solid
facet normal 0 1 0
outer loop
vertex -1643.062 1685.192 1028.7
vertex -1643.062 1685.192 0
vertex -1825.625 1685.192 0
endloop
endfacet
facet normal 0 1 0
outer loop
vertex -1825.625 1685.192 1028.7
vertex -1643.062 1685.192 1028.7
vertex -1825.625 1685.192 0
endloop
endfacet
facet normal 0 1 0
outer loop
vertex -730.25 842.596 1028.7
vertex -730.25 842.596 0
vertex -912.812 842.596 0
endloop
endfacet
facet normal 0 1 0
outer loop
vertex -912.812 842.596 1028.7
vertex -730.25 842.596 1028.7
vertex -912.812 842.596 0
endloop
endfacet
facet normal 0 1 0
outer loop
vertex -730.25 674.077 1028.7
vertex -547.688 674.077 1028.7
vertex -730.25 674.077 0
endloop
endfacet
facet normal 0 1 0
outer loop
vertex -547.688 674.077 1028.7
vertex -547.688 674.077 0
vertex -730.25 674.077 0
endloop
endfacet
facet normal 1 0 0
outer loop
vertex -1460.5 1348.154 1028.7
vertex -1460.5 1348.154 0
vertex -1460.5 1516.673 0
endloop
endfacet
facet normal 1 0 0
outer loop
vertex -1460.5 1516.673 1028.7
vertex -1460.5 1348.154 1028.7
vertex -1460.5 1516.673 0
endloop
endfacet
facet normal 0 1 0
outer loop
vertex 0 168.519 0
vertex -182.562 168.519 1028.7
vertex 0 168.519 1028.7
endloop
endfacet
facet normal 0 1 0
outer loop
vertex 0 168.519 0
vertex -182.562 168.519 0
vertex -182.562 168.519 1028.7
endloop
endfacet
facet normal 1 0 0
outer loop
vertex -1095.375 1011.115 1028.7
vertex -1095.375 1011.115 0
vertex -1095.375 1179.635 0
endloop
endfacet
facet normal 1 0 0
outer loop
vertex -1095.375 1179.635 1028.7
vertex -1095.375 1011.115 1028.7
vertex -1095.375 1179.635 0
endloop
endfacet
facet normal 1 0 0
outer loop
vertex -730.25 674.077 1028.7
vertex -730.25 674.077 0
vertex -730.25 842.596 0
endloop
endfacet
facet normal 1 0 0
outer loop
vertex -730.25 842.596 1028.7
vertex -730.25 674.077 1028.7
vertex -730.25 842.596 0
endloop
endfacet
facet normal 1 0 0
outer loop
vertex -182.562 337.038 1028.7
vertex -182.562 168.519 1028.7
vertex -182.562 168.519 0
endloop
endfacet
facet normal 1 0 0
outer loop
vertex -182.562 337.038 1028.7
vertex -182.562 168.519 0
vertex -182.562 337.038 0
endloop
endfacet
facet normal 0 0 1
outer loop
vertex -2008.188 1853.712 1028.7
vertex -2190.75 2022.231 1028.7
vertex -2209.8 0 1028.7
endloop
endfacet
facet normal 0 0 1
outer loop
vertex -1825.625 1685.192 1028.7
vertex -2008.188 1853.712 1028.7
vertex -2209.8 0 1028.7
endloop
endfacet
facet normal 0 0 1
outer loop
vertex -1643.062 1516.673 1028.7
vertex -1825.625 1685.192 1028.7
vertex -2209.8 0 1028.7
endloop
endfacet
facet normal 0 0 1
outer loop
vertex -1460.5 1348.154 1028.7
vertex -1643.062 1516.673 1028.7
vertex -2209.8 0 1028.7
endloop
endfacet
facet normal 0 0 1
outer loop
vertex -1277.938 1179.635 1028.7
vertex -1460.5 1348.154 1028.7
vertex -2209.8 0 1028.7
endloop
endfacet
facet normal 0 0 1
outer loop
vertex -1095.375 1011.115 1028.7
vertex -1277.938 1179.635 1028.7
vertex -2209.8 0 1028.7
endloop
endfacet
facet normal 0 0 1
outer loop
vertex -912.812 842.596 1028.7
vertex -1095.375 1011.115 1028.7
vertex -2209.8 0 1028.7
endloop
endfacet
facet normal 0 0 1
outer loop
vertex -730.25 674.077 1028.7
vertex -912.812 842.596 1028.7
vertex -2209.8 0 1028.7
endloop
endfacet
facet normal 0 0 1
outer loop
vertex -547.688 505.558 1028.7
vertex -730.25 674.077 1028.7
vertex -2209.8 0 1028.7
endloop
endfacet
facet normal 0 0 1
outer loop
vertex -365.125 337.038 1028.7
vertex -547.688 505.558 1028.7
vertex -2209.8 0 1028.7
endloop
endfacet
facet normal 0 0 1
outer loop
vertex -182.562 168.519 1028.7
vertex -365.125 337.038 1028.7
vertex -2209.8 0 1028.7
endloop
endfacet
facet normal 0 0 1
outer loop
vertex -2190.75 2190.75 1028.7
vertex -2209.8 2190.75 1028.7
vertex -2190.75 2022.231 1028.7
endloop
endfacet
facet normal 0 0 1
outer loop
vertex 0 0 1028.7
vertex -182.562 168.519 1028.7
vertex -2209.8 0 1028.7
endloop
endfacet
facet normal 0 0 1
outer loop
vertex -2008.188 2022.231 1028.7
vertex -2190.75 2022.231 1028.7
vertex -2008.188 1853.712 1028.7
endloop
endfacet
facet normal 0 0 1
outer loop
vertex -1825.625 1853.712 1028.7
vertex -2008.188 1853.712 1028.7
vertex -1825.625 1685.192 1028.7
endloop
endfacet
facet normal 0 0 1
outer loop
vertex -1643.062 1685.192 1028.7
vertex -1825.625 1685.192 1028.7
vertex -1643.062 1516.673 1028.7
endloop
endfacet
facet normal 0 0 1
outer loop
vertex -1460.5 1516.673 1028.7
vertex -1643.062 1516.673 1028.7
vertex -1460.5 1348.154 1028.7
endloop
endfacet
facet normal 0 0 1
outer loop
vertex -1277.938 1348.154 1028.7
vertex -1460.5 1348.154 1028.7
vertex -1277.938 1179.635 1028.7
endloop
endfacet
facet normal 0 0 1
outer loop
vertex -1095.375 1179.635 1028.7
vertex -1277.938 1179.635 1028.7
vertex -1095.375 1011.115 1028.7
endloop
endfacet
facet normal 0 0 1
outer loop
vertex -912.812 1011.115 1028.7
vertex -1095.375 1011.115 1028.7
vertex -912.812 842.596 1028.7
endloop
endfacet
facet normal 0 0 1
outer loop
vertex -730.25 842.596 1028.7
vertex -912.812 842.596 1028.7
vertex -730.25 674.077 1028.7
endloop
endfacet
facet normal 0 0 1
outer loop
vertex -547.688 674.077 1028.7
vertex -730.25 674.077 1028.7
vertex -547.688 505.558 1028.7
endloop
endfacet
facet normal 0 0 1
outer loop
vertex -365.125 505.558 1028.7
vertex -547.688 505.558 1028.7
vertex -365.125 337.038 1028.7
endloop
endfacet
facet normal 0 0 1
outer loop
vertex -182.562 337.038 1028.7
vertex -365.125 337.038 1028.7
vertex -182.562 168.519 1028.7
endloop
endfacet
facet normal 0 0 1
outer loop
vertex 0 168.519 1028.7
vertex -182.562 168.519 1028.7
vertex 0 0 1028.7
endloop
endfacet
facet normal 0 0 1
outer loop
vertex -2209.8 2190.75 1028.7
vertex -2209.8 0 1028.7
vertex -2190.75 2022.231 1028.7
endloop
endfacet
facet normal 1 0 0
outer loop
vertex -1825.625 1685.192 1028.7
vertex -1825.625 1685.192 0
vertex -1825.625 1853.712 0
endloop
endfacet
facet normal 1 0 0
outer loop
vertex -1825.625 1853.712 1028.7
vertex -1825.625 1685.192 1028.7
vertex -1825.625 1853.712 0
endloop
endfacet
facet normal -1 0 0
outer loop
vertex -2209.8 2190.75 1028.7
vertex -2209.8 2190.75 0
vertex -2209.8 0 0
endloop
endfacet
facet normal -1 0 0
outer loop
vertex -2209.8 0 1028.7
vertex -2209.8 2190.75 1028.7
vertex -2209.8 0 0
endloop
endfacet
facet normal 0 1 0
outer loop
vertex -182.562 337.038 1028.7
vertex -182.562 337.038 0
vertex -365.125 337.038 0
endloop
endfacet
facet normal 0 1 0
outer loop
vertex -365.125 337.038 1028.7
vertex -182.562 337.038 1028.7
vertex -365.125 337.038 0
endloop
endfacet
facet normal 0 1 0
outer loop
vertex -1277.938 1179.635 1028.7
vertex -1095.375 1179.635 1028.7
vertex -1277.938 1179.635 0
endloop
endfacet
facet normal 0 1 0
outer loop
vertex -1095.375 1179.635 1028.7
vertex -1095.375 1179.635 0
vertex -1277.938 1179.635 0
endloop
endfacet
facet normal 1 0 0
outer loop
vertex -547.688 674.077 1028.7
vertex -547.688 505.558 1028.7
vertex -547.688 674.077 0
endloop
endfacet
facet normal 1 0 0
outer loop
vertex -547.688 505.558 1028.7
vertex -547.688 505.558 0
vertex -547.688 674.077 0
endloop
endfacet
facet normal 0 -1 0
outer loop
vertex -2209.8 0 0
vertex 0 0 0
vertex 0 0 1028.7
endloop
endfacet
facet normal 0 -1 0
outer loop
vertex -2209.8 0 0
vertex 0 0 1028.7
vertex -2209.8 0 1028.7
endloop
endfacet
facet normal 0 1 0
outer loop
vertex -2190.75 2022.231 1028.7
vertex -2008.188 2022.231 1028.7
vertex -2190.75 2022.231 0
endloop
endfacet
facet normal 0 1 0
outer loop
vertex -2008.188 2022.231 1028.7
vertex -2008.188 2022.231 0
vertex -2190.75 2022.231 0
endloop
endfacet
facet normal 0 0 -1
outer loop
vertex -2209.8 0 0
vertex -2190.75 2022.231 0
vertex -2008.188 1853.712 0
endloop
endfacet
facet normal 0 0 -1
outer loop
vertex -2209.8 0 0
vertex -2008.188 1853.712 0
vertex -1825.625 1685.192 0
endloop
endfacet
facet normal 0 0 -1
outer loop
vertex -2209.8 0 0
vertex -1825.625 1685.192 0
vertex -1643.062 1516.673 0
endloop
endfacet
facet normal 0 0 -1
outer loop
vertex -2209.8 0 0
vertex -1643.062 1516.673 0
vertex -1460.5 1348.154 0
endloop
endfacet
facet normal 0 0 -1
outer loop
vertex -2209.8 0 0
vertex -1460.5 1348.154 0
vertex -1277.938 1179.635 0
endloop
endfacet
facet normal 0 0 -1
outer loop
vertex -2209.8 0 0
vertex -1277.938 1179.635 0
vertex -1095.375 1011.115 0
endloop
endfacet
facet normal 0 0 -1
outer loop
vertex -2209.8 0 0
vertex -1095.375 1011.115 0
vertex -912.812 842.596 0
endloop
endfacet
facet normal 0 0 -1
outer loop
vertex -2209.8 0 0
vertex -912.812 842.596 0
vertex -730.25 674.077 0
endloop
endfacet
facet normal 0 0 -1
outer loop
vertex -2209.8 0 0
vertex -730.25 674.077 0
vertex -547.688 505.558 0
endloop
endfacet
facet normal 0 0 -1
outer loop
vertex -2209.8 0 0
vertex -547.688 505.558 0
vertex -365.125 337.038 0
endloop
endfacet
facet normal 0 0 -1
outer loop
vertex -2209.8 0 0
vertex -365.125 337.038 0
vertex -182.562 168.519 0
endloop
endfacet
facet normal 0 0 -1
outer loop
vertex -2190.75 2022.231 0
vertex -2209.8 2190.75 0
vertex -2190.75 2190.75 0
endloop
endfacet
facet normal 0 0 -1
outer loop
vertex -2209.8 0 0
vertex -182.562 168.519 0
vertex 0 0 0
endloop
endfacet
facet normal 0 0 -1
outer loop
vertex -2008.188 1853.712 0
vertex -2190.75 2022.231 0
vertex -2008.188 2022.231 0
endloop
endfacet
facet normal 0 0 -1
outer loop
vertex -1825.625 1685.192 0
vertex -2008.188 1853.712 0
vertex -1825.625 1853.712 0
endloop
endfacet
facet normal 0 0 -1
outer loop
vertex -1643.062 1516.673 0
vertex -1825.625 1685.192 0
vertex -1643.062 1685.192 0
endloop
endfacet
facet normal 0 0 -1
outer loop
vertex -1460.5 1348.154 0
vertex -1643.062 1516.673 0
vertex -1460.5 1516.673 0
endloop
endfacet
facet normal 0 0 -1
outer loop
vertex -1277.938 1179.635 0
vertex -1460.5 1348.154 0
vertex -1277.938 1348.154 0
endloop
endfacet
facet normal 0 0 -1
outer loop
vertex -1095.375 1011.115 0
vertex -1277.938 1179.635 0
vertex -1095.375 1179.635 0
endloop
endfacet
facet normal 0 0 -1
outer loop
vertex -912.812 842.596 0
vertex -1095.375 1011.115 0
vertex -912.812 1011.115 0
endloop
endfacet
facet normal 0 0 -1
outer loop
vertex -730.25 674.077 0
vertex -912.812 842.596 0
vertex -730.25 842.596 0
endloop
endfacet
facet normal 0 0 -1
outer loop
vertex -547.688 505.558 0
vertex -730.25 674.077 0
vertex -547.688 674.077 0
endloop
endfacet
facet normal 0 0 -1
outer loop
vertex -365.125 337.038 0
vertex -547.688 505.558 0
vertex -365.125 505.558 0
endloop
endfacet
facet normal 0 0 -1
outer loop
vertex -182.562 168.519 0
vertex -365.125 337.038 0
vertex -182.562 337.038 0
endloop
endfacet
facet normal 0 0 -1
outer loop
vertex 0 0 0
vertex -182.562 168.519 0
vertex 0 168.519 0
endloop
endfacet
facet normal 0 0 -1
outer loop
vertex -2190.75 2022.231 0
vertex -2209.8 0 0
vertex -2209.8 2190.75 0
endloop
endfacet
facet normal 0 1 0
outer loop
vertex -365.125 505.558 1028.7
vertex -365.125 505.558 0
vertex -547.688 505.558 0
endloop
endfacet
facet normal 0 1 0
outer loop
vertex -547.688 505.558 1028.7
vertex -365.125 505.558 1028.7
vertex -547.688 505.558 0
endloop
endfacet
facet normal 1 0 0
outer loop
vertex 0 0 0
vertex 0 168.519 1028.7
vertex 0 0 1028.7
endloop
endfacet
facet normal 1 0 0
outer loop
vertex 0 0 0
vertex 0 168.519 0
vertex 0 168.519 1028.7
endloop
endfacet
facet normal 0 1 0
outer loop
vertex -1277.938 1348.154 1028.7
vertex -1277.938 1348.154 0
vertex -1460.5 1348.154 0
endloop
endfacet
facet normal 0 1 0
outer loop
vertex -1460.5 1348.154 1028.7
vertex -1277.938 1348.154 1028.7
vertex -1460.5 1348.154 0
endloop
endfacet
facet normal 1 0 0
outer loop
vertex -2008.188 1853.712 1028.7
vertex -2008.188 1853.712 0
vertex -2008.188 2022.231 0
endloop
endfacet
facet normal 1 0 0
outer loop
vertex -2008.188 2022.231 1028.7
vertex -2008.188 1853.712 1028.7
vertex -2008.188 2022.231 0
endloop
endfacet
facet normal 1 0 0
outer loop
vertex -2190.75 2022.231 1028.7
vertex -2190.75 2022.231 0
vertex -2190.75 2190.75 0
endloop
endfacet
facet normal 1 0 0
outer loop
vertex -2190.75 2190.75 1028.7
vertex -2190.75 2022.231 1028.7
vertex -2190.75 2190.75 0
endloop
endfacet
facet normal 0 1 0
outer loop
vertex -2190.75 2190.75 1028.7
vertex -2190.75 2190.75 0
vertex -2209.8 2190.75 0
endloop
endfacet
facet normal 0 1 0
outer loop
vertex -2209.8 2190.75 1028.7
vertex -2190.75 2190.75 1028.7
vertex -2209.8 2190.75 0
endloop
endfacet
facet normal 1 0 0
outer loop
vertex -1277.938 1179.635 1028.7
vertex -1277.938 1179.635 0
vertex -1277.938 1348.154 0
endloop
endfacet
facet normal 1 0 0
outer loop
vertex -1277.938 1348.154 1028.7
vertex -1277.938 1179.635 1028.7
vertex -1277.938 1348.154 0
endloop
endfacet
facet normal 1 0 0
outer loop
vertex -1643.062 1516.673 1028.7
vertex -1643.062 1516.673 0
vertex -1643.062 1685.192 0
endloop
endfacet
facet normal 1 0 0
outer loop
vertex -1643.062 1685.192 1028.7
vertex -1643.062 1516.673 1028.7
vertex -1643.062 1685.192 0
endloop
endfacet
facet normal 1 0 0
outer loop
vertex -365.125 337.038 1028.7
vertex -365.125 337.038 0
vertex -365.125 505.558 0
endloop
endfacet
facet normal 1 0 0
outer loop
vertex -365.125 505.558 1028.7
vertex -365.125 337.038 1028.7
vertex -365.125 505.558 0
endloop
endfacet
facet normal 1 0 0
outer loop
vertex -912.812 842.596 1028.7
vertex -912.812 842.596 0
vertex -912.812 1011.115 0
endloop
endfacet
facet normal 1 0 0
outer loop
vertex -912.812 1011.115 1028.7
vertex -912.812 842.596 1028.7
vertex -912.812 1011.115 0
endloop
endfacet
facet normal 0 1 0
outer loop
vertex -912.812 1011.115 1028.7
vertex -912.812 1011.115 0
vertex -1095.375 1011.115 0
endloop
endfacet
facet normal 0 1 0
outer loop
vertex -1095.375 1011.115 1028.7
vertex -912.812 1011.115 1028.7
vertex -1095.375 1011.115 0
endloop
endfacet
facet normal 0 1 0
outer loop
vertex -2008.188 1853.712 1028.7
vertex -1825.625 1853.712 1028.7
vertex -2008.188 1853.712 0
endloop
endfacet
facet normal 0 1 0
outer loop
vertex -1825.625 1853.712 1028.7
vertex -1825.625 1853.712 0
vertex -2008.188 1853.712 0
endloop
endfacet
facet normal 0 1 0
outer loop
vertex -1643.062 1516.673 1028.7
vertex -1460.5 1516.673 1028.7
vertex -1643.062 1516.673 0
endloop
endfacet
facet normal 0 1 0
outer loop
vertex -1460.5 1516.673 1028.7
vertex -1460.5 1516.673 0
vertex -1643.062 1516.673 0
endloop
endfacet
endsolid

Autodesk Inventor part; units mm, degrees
ref_plane "YZ Plane" through (0, 0, 0) normal (1, 0, 0) x (0, 1, 0)
ref_plane "XZ Plane" through (0, 0, 0) normal (0, 1, 0) x (-1, 0, 0)
ref_plane "XY Plane" through (0, 0, 0) normal (0, 0, 1) x (1, 0, 0)
sketch "Sketch1" plane through (0, 0, 0) normal (0, 0, 1) x (1, 0, 0)
  line L0 (-182.5625, 168.5192) -> (-182.5625, 337.0385)
  line L1 (-182.5625, 337.0385) -> (-365.125, 337.0385)
  line L2 (-365.125, 337.0385) -> (-365.125, 505.5577)
  line L3 (-365.125, 505.5577) -> (-547.6875, 505.5577)
  line L4 (-547.6875, 505.5577) -> (-547.6875, 674.0769)
  line L5 (-547.6875, 674.0769) -> (-730.25, 674.0769)
  line L6 (-730.25, 674.0769) -> (-730.25, 842.5962)
  line L7 (-730.25, 842.5962) -> (-912.8125, 842.5962)
  line L8 (-912.8125, 842.5962) -> (-912.8125, 1011.1154)
  line L9 (-912.8125, 1011.1154) -> (-1095.375, 1011.1154)
  line L10 (-1095.375, 1011.1154) -> (-1095.375, 1179.6346)
  line L11 (-1095.375, 1179.6346) -> (-1277.9375, 1179.6346)
  line L12 (-1277.9375, 1179.6346) -> (-1277.9375, 1348.1538)
  line L13 (-1277.9375, 1348.1538) -> (-1460.5, 1348.1538)
  line L14 (-1460.5, 1348.1538) -> (-1460.5, 1516.6731)
  line L15 (-1460.5, 1516.6731) -> (-1643.0625, 1516.6731)
  line L16 (-1643.0625, 1516.6731) -> (-1643.0625, 1685.1923)
  line L17 (-1643.0625, 1685.1923) -> (-1825.625, 1685.1923)
  line L18 (-1825.625, 1685.1923) -> (-1825.625, 1853.7115)
  line L19 (-1825.625, 1853.7115) -> (-2008.1875, 1853.7115)
  line L20 (-2008.1875, 1853.7115) -> (-2008.1875, 2022.2308)
  line L21 (-2008.1875, 2022.2308) -> (-2190.75, 2022.2308)
  line L22 (-2190.75, 2022.2308) -> (-2190.75, 2190.75)
  line L23 (-2190.75, 2190.75) -> (-2209.8, 2190.75)
  line L24 (-2209.8, 2190.75) -> (-2209.8, 0)
  line L25 (-182.5625, 168.5192) -> (0, 168.5192)
  line L26 (0, 168.5192) -> (0, 0)
  line L27 (0, 0) -> (-2209.8, 0)
  point P0 (-2590.1533, 586.4349)
  dimension "d3" = 19.05
  dimension "d9" = 2190.75
  dimension "d12" = 2209.8
extrude "Extrusion1" add sketch "Sketch1" along normal blind 1028.7
properties part number "Stairs_Between_Basement_And_First_Floor" material "Wood (Southern Pine)"
